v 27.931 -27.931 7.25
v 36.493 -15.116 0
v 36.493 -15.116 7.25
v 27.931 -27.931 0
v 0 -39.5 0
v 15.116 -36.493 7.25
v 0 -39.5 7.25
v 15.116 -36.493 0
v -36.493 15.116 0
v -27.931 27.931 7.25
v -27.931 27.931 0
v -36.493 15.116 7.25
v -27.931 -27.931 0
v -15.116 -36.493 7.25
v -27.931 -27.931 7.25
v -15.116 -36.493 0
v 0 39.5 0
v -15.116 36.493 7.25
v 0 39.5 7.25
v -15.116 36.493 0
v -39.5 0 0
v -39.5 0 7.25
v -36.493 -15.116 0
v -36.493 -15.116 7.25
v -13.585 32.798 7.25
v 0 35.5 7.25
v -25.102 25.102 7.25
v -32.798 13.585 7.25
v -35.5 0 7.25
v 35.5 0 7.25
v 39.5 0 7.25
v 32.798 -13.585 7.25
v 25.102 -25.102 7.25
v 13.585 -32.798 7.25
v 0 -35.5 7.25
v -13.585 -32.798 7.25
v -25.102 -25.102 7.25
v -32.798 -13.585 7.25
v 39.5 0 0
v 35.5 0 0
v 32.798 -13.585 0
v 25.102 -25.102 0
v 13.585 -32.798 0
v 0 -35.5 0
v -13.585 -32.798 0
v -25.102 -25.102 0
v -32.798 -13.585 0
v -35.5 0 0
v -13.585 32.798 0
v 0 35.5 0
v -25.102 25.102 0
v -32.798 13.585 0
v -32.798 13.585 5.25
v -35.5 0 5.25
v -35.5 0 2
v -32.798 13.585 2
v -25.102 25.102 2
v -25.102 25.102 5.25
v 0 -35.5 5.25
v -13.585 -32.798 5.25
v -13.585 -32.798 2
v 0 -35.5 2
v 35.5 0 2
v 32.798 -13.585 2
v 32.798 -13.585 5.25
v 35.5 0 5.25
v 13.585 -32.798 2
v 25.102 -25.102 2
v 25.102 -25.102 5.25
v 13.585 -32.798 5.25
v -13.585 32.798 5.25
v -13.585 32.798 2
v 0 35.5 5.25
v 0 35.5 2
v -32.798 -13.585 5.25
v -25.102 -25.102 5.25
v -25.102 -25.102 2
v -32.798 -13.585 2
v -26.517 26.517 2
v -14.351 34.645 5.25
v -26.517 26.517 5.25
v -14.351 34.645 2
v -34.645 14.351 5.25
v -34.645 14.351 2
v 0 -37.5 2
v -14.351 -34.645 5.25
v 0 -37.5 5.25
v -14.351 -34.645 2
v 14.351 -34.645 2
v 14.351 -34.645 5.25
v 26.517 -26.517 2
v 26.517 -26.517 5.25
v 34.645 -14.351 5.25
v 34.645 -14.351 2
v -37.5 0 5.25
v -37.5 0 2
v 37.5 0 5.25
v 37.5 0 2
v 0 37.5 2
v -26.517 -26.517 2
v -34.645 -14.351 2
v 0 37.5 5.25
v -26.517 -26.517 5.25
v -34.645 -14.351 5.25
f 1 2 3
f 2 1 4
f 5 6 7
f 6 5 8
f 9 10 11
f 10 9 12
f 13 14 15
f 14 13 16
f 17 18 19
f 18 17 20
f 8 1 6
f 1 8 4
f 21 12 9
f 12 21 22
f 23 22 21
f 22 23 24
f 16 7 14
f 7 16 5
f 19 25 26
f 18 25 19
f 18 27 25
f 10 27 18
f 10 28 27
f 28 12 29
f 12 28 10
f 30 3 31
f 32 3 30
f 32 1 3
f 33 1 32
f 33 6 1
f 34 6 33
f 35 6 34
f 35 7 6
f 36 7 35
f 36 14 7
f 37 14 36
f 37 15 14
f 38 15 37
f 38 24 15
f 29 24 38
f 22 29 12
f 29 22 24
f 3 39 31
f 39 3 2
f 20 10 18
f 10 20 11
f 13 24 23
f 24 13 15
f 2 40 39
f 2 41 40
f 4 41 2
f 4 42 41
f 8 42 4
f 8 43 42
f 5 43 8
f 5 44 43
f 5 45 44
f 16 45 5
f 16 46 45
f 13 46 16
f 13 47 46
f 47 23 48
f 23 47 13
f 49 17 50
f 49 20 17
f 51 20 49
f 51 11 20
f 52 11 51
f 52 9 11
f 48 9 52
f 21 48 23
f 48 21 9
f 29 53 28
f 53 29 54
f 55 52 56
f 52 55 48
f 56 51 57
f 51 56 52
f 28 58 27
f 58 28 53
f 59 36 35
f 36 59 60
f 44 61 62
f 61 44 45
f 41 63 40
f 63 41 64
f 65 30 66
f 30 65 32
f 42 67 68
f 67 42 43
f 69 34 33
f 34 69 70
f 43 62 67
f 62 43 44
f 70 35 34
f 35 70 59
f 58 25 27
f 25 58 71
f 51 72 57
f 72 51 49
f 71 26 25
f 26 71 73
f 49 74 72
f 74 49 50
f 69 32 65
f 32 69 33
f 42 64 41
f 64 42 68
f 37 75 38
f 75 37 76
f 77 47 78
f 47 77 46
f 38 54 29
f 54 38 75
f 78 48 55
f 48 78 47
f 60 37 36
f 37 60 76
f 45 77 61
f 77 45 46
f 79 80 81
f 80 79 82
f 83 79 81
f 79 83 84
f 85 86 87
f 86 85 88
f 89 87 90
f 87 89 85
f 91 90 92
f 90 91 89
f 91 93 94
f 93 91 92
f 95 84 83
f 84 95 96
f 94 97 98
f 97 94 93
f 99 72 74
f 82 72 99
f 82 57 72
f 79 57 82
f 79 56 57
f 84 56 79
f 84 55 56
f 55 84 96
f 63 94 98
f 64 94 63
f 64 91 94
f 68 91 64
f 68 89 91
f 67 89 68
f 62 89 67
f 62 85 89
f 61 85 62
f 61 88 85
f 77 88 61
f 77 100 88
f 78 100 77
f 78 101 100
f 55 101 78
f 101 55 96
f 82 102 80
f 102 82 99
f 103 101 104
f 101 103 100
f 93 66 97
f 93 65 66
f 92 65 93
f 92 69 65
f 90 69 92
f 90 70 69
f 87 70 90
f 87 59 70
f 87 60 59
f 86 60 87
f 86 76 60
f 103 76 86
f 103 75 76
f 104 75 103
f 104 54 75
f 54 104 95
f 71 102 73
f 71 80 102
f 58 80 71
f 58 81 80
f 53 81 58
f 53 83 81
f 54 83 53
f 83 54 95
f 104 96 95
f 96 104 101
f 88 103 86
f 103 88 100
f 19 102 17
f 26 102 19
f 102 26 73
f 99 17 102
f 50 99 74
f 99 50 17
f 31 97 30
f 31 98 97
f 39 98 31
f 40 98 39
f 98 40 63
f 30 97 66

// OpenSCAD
// ==========================================
//
//	Title:			Modular Hose Library
//	Version:		0.2
//	Last Updated:	21 June 2011
//	Author: 		Damian Axford
//	License: 		Attribution - Share Alike - Creative Commons
//	License URL: 	http://creativecommons.org/licenses/by-sa/3.0/
//	Thingiverse URL:	http://www.thingiverse.com/thing:9457
//
// ==========================================


// -----------------------------------------------------------------------------------
// Includes
// -----------------------------------------------------------------------------------

// boxes.scad required for roundedBox module
include <MCAD/boxes.scad>

// -----------------------------------------------------------------------------------
// global variables
// -----------------------------------------------------------------------------------

definition = 16;   // used for $fn parameter when generating curved surfaces
tolerance = 0.2;  // distance between ball and socket surfaces

// fractions of an inch
i1 = 25.4;
i4 = i1/4;
i8 = i1/8;
i16 = i1/16;

// -----------------------------------------------------------------------------------
// Discrete elements, non-chainable
// -----------------------------------------------------------------------------------

module modularHoseBall(mhBore) {
	mhBallOD = mhBore*2;
	mhOffsetToBallCenter=0.61 * mhBore;
	mhOffsetToTopOfBall=1.07 * mhBore;
	mhWideBore=mhBore * 1.6;  // started at 1.32
	mhBallID = mhBore * 1.6;
	mhOffsetToInnerBallCenter = 0.75 * mhBore;

	difference() {
		union() {
			translate([0,0,mhOffsetToBallCenter]) sphere(r = mhBallOD/2, $fn = definition);
		}

		// Remove top of ball
		translate([0,0,mhOffsetToTopOfBall + mhBallOD/2]) cube(size = [mhBallOD,mhBallOD,mhBallOD], center=true);
	
		// Remove bottom of ball
		translate([0,0,-mhBallOD/2]) cube(size = [mhBallOD,mhBallOD,mhBallOD], center=true);

		// hollow out the ball
		translate([0,0,-0.01]) cylinder(h=mhOffsetToTopOfBall+0.02, r1=mhBore/2 ,r2=mhWideBore/2, $fn=definition);

		// hollow out some more with a stretched sphere
		translate([0,0,mhOffsetToInnerBallCenter]) scale([1,1,1.2]) sphere(r = mhBallID/2, $fn = definition);
	}
}

// -----------------------------------------------------------------------------------
// Discrete elements, chainable
// -----------------------------------------------------------------------------------

mhSocketHeightScaleFactor = 1.26 + 0.39;

module modularHoseSocket(mhBore) {
	mhOffsetToSocketCenter=0.31 * mhBore;
	mhOffsetToBaseOfSkirt = 0.39 * mhBore;
	mhSocketID = tolerance + mhBore * 2;
	mhSkirtOD = 2.40 * mhBore;    // started at 2.52
	mhSkirtHeight = 1.26*mhBore;   
	mhWaistOD = 1.58 * mhBore;
	mhRimRadius = 0.18 * mhBore;
	mhSocketChamferOffset = 0.79 * mhBore;
	mhSocketChamferHeight = 0.86 * mhBore;
	mhSocketChamferID = mhBore*1.77;

	union() {
		translate([0,0,mhSkirtHeight + mhOffsetToBaseOfSkirt]) child(0);
		difference() {
			union() {		
	
				// Skirt
				translate([0,0,mhOffsetToBaseOfSkirt]) cylinder(h=mhSkirtHeight, r1=mhSkirtOD/2, r2=mhWaistOD/2, $fn = definition);
		
				// Rim
				// Rim - collar
				translate([0,0,mhRimRadius]) cylinder(h = mhOffsetToBaseOfSkirt-mhRimRadius, r = mhSkirtOD/2, $fn = definition);
		
				// Rim - radius
				rotate_extrude(convexity = 10, $fn = definition) translate([(mhSkirtOD/2) - mhRimRadius, mhRimRadius, 0]) circle(r = mhRimRadius, $fn = definition/2);
			
				// Rim - cap
				cylinder(h= mhRimRadius, r=(mhSkirtOD/2) - mhRimRadius, $fn = definition);
			}
		
			// removeBore
			translate([0,0,-1]) cylinder(h=mhSkirtHeight + mhOffsetToBaseOfSkirt + 2,r=mhBore/2, $fn=definition);
		
			// straighten socket sides
			translate([0,0,mhSocketChamferOffset]) cylinder(h=mhSocketChamferHeight,r1=mhSocketChamferID/2,r2=mhBore/2, $fn=definition);
		
			// remove socket		
			translate([0,0,mhOffsetToSocketCenter]) sphere(r = mhSocketID/2, $fn = definition);
		}
	}
}

module modularHoseWaist(mhBore, mhWaistHeight) {

	mhWaistOD = 1.58 * mhBore;

	union() {
		translate([0,0,mhWaistHeight]) child(0);
		difference() {
			translate([0,0,-0.01]) cylinder(h= mhWaistHeight + 0.02, r=mhWaistOD/2, $fn = definition);
				
			// removeBore
			translate([0,0,-1]) cylinder(h=mhWaistHeight+2,r=mhBore/2, $fn=definition);
		}
	}
}

module modularHoseRoundNozzleTip(mhBore, mhNozzleID) {

	mhWaistOD = 1.58 * mhBore;
	mhNozzleHeight = 2 * mhBore;
	mhNozzleOD = mhNozzleID + 1.2;

	difference() {
		union() {
			translate([0,0,mhNozzleHeight]) child(0);

			cylinder(h= mhNozzleHeight, r1=mhWaistOD/2, r2=mhNozzleOD/2, $fn = definition);
		}
	
		// removeBore
		translate([0,0,-0.01]) cylinder(h=mhNozzleHeight+0.02,r1=mhBore/2, r2=mhNozzleID/2, $fn=definition);
	}

}

module modularHoseFlareNozzleTip(mhBore, mhNozzleWidth,mhNozzleThickness) {

	mhWaistOD = 1.58 * mhBore;
	mhNozzleHeight = 2 * mhBore;

	difference() {
		union() {
			translate([0,0,mhNozzleHeight]) child(0);

			cylinder(h= mhNozzleHeight, r1=mhWaistOD/2, r2=mhNozzleWidth/2, $fn = definition);
		}
	
		// removeBore
		translate([0,0,-0.01]) cylinder(h=mhNozzleHeight+0.02,r1=mhBore/2, r2=mhNozzleThickness/2, $fn=definition);
	}

}

// -----------------------------------------------------------------------------------
// Composite elements, non-chainable
// -----------------------------------------------------------------------------------

module modularHoseSegment(mhBore) {
	modularHoseSocket(mhBore) modularHoseWaist(mhBore, 0.24 *mhBore) modularHoseBall(mhBore);
}

module modularHoseExtendedSegment(mhBore, mhWaistHeight) {
	modularHoseSocket(mhBore) modularHoseWaist(mhBore, mhWaistHeight) modularHoseBall(mhBore);
}

module modularHoseRoundNozzle(mhBore,mhNozzleID) {
	modularHoseSocket(mhBore) modularHoseRoundNozzleTip(mhBore, mhNozzleID);
}

module modularHoseFlareNozzle(mhBore,mhNozzleWidth,mhNozzleThickness) {
	modularHoseSocket(mhBore) modularHoseFlareNozzleTip(mhBore, mhNozzleWidth, mhNozzleThickness);
}

module modularHoseBasePlate(mhBore, mhThreadDia=3) {
	mhWaistOD = 1.58 * mhBore;
	mhPlateHeight = 0.5 * mhBore;
	mhPlateWidth = mhWaistOD + 4*mhThreadDia;
	mhScrewOffset=mhWaistOD/2 + mhThreadDia/2;

	union() {
		translate([0,0,1 + mhPlateHeight*2]) modularHoseBall(mhBore);
		translate([0,0,1]) modularHoseWaist(mhBore, mhPlateHeight*2);
		difference() {
			translate([0,0,mhPlateHeight/2]) roundedBox([mhPlateWidth,mhPlateWidth,mhPlateHeight], radius=2*mhThreadDia, sidesonly=true, $fn=definition);
			
			// remove central bore (perhaps to feed cables through?)
			translate([0,0,-0.01]) cylinder(h=mhPlateHeight+0.02,r=mhBore/2, $fn=definition);
			
	
			// remove screw holes
			for ( x = [-1, 1]) {
				for ( y = [-1, 1]) {
					translate([x * mhScrewOffset,y * mhScrewOffset,-1]) 
      						cylinder(h=mhPlateHeight+2,r=mhThreadDia/2, $fn=12);
				}
			}
		}
	}
}

module modularHoseDoubleSocket(mhBore) {
	union() {
		modularHoseSocket(mhBore);
		translate([0,0,mhSocketHeightScaleFactor * mhBore]) translate([0,0,mhSocketHeightScaleFactor * mhBore]) mirror([0,0,1]) modularHoseSocket(mhBore);
	}
}

// -----------------------------------------------------------------------------------
//   Debug code - shows a cross section through two "joined" hose segments with a 1mm "ruler" overlay
// -----------------------------------------------------------------------------------

if (false) {
	// top segment
	difference() {	
		translate([0,0,13.9]) modularHoseSegment(i4);
		translate([-10,0,-1]) cube(size=[20,20,100]);
	}	
	
	// bottom segment
	difference() {	
		modularHoseSegment(i4);	
		translate([-10,0,-1]) cube(size=[20,20,20]);
	}
	
	
	// Show a ruler
	for (i= [-10 : 10]) {
		translate([i - 0.05,0,0]) rotate([90,0,0]) color([0.9,0.9,0.9,1]) square(size=[0.1,20]);
	}
}


// -----------------------------------------------------------------------------------
//   Example usage of Composite elements
// -----------------------------------------------------------------------------------

module evenlySpaceX(spacing) {
  
	for (i = [0 : $children-1])
    		translate([i * spacing , 0, 0 ]) child(i);
}

// pass "false" to if statement to hide example elements
/*
i1 = 25.4;
i4 = 25.4/4;
i8 = 25.4/8;
i16 = 25.4/16;
*/
if (false) {
	translate([0,0,0]) evenlySpaceX(25) {
		modularHoseRoundNozzle(i4, i4);
		modularHoseRoundNozzle(i4, i8);
		modularHoseRoundNozzle(i4, i16);
	}
	
	translate([0,25,0]) evenlySpaceX(25) {
		modularHoseSegment(i4);
		modularHoseExtendedSegment(i4,20);
		
		modularHoseBasePlate(i4);

		modularHoseDoubleSocket(i4);
	}
} else {
	// uncomment the following lines and use to quickly generate STL

	//modularHoseRoundNozzle(i4, i8);
	// modularHoseSegment(i4);
	//modularHoseBasePlate(i4);
	//modularHoseDoubleSocket(i4);

	//modularHoseFlareNozzle(i4, i1, i1/1.5);
    
    myBore = 6.05;

    // Alligator clip holder
    /*
    modularHoseSocket(myBore) modularHoseWaist(myBore,18);
    */
    
        
    // Magnifier holder
    if (true) {
        // These are the only real parameters
        lensDiameter = 75;
        lensEdgeThickness = 3.25;
        frameShell = 2;
        
        // calculated
        frameThickness = lensEdgeThickness+2*frameShell;
        outerDiameter = lensDiameter+2*frameShell;
        cutoutDiameter = lensDiameter-2*frameShell;
        // modularHoseSocket(myBore) modularHoseWaist(myBore,10);
        
        // translate([-6,0,outerDiameter/2+15])
            // rotate([0,90,0])
                difference() {
                    // Outer cylinder (frame)
                    cylinder(h=frameThickness, d=outerDiameter, $fn=definition);
                    // Inner cylinder (cutout)
                    cylinder(h=frameThickness, d=cutoutDiameter, $fn=definition);
                    // Lens cutout
                    translate([0,0,frameShell])
                        cylinder(h=lensEdgeThickness, d=lensDiameter, $fn=definition);
                    // Top cutaway
                    translate([0,0,0])
                        // rotate([0,0,45])
                            cube([outerDiameter, outerDiameter, frameThickness], false);
                    }
    }

    // modularHoseExtendedSegment(i4,20);

}
